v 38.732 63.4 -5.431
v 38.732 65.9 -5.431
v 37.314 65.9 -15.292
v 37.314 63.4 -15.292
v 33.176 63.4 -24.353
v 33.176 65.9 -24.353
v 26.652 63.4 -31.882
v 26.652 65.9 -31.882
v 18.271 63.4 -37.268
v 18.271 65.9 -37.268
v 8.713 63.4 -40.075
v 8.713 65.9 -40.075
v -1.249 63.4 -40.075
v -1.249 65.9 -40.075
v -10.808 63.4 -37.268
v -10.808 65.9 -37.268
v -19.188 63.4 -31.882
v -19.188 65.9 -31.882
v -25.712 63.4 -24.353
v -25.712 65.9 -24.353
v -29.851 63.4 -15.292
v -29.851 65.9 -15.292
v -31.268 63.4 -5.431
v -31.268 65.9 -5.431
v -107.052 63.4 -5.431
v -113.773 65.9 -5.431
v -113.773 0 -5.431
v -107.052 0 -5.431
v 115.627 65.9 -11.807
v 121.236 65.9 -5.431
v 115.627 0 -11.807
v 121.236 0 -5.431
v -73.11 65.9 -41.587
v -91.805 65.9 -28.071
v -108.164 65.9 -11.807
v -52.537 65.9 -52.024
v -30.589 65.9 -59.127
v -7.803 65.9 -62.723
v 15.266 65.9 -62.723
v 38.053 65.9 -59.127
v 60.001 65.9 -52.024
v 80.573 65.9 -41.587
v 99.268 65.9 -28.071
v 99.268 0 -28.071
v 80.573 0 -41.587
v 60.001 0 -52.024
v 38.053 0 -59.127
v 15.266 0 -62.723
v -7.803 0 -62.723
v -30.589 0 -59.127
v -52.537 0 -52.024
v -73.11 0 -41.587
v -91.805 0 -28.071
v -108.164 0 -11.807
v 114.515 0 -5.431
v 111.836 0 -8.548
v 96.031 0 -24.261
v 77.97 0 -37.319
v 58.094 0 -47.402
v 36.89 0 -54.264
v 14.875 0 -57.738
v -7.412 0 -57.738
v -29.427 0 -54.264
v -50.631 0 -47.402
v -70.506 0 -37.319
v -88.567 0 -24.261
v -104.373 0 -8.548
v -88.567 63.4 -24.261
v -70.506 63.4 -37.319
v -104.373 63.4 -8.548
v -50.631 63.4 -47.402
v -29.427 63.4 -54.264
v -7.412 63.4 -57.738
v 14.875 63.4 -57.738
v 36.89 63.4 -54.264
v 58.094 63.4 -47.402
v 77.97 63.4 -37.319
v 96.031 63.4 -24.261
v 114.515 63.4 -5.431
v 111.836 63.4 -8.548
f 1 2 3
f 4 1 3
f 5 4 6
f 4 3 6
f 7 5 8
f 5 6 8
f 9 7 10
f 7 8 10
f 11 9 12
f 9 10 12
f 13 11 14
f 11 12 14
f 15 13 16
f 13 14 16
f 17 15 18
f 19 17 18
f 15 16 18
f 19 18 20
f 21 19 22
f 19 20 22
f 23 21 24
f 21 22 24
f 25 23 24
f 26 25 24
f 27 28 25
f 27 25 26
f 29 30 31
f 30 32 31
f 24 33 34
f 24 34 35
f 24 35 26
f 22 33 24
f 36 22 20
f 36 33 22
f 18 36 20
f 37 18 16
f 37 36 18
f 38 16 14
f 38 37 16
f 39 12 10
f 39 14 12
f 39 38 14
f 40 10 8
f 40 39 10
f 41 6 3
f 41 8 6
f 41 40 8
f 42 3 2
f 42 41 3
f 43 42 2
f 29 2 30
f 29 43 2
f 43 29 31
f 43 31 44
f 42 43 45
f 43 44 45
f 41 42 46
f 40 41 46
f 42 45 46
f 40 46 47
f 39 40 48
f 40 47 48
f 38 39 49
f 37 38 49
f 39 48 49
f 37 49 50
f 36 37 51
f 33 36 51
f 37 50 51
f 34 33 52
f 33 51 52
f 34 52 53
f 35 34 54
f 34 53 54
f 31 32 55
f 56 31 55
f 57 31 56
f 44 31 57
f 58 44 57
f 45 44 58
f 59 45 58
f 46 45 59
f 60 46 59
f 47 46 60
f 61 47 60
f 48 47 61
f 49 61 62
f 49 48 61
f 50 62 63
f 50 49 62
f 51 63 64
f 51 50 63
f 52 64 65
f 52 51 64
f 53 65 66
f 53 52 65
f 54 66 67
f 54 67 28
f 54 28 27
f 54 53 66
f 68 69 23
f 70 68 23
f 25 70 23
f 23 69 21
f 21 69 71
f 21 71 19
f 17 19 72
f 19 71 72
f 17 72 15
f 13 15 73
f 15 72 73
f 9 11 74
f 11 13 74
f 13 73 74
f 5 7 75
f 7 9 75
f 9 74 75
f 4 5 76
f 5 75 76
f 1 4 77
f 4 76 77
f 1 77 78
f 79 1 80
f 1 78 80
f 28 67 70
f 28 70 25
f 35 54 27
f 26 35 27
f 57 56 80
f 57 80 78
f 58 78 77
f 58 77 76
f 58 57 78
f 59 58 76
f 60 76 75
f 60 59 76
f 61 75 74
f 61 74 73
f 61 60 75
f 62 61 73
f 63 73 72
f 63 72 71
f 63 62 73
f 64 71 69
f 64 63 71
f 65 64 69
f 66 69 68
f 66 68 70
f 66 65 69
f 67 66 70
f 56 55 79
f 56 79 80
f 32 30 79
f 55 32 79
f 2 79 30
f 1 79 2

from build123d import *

# Parameters (mm, degrees)
BOSS_EXTRUDE1_DEPTH = 63.4
BOSS_EXTRUDE2_DEPTH = 2.5
BOSS_EXTRUDE3_DEPTH = 63.4
SKETCH4_R           = 35
CUT_EXTRUDE1_DEPTH  = 152.762941692


with BuildPart() as part:
    # Sketch1 → Boss-Extrude1 (new body)
    with BuildSketch(Plane(origin=(0, 0, 0), x_dir=(1, 0, 0), z_dir=(0, 1, 0))):
        with BuildLine():
            Line((-108.164150322, 11.807033697), (-113.772816425, 5.431031062))
            Line((-113.772816425, 5.431031062), (-110.443441346, 5.431031062))
            Line((-110.443441346, 5.431031062), (-106.2683534, 10.177323898))
            ThreePointArc((-106.2683534, 10.177323898), (3.7316466, 60.67425262), (113.7316466, 10.177323898))
            Line((113.7316466, 10.177323898), (117.906734545, 5.431031062))
            Line((117.906734545, 5.431031062), (121.236109625, 5.431031062))
            Line((121.236109625, 5.431031062), (115.627443521, 11.807033697))
            ThreePointArc((115.627443521, 11.807033697), (3.7316466, 63.17425262), (-108.164150322, 11.807033697))
        make_face()
    extrude(amount=BOSS_EXTRUDE1_DEPTH)

    # Sketch2 → Boss-Extrude2 (add)
    with BuildSketch(Plane(origin=(0, 63.4, 0), x_dir=(1, 0, 0), z_dir=(0, 1, 0))):
        with BuildLine():
            Line((-113.772816425, 5.431031062), (121.236109625, 5.431031062))
            Line((121.236109625, 5.431031062), (115.627443521, 11.807033697))
            ThreePointArc((115.627443521, 11.807033697), (3.7316466, 63.17425262), (-108.164150322, 11.807033697))
            Line((-108.164150322, 11.807033697), (-113.772816425, 5.431031062))
        make_face()
    extrude(amount=BOSS_EXTRUDE2_DEPTH)

    # Sketch3 → Boss-Extrude3 (add)
    with BuildSketch(Plane(origin=(0, 0, 0), x_dir=(1, 0, 0), z_dir=(0, 1, 0))):
        with BuildLine():
            Line((-110.443441346, 5.431031062), (-106.2683534, 10.177323898))
            ThreePointArc((-106.2683534, 10.177323898), (3.7316466, 60.67425262), (113.7316466, 10.177323898))
            Line((113.7316466, 10.177323898), (117.906734545, 5.431031062))
            Line((117.906734545, 5.431031062), (114.515000518, 5.431031062))
            Line((114.515000518, 5.431031062), (111.835849678, 8.547614098))
            ThreePointArc((111.835849678, 8.547614098), (3.7316466, 58.17425262), (-104.372556479, 8.547614098))
            Line((-104.372556479, 8.547614098), (-107.051707318, 5.431031062))
            Line((-107.051707318, 5.431031062), (-110.443441346, 5.431031062))
        make_face()
    extrude(amount=BOSS_EXTRUDE3_DEPTH)

    # Sketch4 → Cut-Extrude1 (cut, through all)
    with BuildSketch(Plane(origin=(0, 65.9, 0), x_dir=(1, 0, 0), z_dir=(0, 1, 0))):
        with Locations((3.7316466, 5.431031062)):
            Circle(SKETCH4_R)
    extrude(amount=-CUT_EXTRUDE1_DEPTH, mode=Mode.SUBTRACT)


solid = part.part
